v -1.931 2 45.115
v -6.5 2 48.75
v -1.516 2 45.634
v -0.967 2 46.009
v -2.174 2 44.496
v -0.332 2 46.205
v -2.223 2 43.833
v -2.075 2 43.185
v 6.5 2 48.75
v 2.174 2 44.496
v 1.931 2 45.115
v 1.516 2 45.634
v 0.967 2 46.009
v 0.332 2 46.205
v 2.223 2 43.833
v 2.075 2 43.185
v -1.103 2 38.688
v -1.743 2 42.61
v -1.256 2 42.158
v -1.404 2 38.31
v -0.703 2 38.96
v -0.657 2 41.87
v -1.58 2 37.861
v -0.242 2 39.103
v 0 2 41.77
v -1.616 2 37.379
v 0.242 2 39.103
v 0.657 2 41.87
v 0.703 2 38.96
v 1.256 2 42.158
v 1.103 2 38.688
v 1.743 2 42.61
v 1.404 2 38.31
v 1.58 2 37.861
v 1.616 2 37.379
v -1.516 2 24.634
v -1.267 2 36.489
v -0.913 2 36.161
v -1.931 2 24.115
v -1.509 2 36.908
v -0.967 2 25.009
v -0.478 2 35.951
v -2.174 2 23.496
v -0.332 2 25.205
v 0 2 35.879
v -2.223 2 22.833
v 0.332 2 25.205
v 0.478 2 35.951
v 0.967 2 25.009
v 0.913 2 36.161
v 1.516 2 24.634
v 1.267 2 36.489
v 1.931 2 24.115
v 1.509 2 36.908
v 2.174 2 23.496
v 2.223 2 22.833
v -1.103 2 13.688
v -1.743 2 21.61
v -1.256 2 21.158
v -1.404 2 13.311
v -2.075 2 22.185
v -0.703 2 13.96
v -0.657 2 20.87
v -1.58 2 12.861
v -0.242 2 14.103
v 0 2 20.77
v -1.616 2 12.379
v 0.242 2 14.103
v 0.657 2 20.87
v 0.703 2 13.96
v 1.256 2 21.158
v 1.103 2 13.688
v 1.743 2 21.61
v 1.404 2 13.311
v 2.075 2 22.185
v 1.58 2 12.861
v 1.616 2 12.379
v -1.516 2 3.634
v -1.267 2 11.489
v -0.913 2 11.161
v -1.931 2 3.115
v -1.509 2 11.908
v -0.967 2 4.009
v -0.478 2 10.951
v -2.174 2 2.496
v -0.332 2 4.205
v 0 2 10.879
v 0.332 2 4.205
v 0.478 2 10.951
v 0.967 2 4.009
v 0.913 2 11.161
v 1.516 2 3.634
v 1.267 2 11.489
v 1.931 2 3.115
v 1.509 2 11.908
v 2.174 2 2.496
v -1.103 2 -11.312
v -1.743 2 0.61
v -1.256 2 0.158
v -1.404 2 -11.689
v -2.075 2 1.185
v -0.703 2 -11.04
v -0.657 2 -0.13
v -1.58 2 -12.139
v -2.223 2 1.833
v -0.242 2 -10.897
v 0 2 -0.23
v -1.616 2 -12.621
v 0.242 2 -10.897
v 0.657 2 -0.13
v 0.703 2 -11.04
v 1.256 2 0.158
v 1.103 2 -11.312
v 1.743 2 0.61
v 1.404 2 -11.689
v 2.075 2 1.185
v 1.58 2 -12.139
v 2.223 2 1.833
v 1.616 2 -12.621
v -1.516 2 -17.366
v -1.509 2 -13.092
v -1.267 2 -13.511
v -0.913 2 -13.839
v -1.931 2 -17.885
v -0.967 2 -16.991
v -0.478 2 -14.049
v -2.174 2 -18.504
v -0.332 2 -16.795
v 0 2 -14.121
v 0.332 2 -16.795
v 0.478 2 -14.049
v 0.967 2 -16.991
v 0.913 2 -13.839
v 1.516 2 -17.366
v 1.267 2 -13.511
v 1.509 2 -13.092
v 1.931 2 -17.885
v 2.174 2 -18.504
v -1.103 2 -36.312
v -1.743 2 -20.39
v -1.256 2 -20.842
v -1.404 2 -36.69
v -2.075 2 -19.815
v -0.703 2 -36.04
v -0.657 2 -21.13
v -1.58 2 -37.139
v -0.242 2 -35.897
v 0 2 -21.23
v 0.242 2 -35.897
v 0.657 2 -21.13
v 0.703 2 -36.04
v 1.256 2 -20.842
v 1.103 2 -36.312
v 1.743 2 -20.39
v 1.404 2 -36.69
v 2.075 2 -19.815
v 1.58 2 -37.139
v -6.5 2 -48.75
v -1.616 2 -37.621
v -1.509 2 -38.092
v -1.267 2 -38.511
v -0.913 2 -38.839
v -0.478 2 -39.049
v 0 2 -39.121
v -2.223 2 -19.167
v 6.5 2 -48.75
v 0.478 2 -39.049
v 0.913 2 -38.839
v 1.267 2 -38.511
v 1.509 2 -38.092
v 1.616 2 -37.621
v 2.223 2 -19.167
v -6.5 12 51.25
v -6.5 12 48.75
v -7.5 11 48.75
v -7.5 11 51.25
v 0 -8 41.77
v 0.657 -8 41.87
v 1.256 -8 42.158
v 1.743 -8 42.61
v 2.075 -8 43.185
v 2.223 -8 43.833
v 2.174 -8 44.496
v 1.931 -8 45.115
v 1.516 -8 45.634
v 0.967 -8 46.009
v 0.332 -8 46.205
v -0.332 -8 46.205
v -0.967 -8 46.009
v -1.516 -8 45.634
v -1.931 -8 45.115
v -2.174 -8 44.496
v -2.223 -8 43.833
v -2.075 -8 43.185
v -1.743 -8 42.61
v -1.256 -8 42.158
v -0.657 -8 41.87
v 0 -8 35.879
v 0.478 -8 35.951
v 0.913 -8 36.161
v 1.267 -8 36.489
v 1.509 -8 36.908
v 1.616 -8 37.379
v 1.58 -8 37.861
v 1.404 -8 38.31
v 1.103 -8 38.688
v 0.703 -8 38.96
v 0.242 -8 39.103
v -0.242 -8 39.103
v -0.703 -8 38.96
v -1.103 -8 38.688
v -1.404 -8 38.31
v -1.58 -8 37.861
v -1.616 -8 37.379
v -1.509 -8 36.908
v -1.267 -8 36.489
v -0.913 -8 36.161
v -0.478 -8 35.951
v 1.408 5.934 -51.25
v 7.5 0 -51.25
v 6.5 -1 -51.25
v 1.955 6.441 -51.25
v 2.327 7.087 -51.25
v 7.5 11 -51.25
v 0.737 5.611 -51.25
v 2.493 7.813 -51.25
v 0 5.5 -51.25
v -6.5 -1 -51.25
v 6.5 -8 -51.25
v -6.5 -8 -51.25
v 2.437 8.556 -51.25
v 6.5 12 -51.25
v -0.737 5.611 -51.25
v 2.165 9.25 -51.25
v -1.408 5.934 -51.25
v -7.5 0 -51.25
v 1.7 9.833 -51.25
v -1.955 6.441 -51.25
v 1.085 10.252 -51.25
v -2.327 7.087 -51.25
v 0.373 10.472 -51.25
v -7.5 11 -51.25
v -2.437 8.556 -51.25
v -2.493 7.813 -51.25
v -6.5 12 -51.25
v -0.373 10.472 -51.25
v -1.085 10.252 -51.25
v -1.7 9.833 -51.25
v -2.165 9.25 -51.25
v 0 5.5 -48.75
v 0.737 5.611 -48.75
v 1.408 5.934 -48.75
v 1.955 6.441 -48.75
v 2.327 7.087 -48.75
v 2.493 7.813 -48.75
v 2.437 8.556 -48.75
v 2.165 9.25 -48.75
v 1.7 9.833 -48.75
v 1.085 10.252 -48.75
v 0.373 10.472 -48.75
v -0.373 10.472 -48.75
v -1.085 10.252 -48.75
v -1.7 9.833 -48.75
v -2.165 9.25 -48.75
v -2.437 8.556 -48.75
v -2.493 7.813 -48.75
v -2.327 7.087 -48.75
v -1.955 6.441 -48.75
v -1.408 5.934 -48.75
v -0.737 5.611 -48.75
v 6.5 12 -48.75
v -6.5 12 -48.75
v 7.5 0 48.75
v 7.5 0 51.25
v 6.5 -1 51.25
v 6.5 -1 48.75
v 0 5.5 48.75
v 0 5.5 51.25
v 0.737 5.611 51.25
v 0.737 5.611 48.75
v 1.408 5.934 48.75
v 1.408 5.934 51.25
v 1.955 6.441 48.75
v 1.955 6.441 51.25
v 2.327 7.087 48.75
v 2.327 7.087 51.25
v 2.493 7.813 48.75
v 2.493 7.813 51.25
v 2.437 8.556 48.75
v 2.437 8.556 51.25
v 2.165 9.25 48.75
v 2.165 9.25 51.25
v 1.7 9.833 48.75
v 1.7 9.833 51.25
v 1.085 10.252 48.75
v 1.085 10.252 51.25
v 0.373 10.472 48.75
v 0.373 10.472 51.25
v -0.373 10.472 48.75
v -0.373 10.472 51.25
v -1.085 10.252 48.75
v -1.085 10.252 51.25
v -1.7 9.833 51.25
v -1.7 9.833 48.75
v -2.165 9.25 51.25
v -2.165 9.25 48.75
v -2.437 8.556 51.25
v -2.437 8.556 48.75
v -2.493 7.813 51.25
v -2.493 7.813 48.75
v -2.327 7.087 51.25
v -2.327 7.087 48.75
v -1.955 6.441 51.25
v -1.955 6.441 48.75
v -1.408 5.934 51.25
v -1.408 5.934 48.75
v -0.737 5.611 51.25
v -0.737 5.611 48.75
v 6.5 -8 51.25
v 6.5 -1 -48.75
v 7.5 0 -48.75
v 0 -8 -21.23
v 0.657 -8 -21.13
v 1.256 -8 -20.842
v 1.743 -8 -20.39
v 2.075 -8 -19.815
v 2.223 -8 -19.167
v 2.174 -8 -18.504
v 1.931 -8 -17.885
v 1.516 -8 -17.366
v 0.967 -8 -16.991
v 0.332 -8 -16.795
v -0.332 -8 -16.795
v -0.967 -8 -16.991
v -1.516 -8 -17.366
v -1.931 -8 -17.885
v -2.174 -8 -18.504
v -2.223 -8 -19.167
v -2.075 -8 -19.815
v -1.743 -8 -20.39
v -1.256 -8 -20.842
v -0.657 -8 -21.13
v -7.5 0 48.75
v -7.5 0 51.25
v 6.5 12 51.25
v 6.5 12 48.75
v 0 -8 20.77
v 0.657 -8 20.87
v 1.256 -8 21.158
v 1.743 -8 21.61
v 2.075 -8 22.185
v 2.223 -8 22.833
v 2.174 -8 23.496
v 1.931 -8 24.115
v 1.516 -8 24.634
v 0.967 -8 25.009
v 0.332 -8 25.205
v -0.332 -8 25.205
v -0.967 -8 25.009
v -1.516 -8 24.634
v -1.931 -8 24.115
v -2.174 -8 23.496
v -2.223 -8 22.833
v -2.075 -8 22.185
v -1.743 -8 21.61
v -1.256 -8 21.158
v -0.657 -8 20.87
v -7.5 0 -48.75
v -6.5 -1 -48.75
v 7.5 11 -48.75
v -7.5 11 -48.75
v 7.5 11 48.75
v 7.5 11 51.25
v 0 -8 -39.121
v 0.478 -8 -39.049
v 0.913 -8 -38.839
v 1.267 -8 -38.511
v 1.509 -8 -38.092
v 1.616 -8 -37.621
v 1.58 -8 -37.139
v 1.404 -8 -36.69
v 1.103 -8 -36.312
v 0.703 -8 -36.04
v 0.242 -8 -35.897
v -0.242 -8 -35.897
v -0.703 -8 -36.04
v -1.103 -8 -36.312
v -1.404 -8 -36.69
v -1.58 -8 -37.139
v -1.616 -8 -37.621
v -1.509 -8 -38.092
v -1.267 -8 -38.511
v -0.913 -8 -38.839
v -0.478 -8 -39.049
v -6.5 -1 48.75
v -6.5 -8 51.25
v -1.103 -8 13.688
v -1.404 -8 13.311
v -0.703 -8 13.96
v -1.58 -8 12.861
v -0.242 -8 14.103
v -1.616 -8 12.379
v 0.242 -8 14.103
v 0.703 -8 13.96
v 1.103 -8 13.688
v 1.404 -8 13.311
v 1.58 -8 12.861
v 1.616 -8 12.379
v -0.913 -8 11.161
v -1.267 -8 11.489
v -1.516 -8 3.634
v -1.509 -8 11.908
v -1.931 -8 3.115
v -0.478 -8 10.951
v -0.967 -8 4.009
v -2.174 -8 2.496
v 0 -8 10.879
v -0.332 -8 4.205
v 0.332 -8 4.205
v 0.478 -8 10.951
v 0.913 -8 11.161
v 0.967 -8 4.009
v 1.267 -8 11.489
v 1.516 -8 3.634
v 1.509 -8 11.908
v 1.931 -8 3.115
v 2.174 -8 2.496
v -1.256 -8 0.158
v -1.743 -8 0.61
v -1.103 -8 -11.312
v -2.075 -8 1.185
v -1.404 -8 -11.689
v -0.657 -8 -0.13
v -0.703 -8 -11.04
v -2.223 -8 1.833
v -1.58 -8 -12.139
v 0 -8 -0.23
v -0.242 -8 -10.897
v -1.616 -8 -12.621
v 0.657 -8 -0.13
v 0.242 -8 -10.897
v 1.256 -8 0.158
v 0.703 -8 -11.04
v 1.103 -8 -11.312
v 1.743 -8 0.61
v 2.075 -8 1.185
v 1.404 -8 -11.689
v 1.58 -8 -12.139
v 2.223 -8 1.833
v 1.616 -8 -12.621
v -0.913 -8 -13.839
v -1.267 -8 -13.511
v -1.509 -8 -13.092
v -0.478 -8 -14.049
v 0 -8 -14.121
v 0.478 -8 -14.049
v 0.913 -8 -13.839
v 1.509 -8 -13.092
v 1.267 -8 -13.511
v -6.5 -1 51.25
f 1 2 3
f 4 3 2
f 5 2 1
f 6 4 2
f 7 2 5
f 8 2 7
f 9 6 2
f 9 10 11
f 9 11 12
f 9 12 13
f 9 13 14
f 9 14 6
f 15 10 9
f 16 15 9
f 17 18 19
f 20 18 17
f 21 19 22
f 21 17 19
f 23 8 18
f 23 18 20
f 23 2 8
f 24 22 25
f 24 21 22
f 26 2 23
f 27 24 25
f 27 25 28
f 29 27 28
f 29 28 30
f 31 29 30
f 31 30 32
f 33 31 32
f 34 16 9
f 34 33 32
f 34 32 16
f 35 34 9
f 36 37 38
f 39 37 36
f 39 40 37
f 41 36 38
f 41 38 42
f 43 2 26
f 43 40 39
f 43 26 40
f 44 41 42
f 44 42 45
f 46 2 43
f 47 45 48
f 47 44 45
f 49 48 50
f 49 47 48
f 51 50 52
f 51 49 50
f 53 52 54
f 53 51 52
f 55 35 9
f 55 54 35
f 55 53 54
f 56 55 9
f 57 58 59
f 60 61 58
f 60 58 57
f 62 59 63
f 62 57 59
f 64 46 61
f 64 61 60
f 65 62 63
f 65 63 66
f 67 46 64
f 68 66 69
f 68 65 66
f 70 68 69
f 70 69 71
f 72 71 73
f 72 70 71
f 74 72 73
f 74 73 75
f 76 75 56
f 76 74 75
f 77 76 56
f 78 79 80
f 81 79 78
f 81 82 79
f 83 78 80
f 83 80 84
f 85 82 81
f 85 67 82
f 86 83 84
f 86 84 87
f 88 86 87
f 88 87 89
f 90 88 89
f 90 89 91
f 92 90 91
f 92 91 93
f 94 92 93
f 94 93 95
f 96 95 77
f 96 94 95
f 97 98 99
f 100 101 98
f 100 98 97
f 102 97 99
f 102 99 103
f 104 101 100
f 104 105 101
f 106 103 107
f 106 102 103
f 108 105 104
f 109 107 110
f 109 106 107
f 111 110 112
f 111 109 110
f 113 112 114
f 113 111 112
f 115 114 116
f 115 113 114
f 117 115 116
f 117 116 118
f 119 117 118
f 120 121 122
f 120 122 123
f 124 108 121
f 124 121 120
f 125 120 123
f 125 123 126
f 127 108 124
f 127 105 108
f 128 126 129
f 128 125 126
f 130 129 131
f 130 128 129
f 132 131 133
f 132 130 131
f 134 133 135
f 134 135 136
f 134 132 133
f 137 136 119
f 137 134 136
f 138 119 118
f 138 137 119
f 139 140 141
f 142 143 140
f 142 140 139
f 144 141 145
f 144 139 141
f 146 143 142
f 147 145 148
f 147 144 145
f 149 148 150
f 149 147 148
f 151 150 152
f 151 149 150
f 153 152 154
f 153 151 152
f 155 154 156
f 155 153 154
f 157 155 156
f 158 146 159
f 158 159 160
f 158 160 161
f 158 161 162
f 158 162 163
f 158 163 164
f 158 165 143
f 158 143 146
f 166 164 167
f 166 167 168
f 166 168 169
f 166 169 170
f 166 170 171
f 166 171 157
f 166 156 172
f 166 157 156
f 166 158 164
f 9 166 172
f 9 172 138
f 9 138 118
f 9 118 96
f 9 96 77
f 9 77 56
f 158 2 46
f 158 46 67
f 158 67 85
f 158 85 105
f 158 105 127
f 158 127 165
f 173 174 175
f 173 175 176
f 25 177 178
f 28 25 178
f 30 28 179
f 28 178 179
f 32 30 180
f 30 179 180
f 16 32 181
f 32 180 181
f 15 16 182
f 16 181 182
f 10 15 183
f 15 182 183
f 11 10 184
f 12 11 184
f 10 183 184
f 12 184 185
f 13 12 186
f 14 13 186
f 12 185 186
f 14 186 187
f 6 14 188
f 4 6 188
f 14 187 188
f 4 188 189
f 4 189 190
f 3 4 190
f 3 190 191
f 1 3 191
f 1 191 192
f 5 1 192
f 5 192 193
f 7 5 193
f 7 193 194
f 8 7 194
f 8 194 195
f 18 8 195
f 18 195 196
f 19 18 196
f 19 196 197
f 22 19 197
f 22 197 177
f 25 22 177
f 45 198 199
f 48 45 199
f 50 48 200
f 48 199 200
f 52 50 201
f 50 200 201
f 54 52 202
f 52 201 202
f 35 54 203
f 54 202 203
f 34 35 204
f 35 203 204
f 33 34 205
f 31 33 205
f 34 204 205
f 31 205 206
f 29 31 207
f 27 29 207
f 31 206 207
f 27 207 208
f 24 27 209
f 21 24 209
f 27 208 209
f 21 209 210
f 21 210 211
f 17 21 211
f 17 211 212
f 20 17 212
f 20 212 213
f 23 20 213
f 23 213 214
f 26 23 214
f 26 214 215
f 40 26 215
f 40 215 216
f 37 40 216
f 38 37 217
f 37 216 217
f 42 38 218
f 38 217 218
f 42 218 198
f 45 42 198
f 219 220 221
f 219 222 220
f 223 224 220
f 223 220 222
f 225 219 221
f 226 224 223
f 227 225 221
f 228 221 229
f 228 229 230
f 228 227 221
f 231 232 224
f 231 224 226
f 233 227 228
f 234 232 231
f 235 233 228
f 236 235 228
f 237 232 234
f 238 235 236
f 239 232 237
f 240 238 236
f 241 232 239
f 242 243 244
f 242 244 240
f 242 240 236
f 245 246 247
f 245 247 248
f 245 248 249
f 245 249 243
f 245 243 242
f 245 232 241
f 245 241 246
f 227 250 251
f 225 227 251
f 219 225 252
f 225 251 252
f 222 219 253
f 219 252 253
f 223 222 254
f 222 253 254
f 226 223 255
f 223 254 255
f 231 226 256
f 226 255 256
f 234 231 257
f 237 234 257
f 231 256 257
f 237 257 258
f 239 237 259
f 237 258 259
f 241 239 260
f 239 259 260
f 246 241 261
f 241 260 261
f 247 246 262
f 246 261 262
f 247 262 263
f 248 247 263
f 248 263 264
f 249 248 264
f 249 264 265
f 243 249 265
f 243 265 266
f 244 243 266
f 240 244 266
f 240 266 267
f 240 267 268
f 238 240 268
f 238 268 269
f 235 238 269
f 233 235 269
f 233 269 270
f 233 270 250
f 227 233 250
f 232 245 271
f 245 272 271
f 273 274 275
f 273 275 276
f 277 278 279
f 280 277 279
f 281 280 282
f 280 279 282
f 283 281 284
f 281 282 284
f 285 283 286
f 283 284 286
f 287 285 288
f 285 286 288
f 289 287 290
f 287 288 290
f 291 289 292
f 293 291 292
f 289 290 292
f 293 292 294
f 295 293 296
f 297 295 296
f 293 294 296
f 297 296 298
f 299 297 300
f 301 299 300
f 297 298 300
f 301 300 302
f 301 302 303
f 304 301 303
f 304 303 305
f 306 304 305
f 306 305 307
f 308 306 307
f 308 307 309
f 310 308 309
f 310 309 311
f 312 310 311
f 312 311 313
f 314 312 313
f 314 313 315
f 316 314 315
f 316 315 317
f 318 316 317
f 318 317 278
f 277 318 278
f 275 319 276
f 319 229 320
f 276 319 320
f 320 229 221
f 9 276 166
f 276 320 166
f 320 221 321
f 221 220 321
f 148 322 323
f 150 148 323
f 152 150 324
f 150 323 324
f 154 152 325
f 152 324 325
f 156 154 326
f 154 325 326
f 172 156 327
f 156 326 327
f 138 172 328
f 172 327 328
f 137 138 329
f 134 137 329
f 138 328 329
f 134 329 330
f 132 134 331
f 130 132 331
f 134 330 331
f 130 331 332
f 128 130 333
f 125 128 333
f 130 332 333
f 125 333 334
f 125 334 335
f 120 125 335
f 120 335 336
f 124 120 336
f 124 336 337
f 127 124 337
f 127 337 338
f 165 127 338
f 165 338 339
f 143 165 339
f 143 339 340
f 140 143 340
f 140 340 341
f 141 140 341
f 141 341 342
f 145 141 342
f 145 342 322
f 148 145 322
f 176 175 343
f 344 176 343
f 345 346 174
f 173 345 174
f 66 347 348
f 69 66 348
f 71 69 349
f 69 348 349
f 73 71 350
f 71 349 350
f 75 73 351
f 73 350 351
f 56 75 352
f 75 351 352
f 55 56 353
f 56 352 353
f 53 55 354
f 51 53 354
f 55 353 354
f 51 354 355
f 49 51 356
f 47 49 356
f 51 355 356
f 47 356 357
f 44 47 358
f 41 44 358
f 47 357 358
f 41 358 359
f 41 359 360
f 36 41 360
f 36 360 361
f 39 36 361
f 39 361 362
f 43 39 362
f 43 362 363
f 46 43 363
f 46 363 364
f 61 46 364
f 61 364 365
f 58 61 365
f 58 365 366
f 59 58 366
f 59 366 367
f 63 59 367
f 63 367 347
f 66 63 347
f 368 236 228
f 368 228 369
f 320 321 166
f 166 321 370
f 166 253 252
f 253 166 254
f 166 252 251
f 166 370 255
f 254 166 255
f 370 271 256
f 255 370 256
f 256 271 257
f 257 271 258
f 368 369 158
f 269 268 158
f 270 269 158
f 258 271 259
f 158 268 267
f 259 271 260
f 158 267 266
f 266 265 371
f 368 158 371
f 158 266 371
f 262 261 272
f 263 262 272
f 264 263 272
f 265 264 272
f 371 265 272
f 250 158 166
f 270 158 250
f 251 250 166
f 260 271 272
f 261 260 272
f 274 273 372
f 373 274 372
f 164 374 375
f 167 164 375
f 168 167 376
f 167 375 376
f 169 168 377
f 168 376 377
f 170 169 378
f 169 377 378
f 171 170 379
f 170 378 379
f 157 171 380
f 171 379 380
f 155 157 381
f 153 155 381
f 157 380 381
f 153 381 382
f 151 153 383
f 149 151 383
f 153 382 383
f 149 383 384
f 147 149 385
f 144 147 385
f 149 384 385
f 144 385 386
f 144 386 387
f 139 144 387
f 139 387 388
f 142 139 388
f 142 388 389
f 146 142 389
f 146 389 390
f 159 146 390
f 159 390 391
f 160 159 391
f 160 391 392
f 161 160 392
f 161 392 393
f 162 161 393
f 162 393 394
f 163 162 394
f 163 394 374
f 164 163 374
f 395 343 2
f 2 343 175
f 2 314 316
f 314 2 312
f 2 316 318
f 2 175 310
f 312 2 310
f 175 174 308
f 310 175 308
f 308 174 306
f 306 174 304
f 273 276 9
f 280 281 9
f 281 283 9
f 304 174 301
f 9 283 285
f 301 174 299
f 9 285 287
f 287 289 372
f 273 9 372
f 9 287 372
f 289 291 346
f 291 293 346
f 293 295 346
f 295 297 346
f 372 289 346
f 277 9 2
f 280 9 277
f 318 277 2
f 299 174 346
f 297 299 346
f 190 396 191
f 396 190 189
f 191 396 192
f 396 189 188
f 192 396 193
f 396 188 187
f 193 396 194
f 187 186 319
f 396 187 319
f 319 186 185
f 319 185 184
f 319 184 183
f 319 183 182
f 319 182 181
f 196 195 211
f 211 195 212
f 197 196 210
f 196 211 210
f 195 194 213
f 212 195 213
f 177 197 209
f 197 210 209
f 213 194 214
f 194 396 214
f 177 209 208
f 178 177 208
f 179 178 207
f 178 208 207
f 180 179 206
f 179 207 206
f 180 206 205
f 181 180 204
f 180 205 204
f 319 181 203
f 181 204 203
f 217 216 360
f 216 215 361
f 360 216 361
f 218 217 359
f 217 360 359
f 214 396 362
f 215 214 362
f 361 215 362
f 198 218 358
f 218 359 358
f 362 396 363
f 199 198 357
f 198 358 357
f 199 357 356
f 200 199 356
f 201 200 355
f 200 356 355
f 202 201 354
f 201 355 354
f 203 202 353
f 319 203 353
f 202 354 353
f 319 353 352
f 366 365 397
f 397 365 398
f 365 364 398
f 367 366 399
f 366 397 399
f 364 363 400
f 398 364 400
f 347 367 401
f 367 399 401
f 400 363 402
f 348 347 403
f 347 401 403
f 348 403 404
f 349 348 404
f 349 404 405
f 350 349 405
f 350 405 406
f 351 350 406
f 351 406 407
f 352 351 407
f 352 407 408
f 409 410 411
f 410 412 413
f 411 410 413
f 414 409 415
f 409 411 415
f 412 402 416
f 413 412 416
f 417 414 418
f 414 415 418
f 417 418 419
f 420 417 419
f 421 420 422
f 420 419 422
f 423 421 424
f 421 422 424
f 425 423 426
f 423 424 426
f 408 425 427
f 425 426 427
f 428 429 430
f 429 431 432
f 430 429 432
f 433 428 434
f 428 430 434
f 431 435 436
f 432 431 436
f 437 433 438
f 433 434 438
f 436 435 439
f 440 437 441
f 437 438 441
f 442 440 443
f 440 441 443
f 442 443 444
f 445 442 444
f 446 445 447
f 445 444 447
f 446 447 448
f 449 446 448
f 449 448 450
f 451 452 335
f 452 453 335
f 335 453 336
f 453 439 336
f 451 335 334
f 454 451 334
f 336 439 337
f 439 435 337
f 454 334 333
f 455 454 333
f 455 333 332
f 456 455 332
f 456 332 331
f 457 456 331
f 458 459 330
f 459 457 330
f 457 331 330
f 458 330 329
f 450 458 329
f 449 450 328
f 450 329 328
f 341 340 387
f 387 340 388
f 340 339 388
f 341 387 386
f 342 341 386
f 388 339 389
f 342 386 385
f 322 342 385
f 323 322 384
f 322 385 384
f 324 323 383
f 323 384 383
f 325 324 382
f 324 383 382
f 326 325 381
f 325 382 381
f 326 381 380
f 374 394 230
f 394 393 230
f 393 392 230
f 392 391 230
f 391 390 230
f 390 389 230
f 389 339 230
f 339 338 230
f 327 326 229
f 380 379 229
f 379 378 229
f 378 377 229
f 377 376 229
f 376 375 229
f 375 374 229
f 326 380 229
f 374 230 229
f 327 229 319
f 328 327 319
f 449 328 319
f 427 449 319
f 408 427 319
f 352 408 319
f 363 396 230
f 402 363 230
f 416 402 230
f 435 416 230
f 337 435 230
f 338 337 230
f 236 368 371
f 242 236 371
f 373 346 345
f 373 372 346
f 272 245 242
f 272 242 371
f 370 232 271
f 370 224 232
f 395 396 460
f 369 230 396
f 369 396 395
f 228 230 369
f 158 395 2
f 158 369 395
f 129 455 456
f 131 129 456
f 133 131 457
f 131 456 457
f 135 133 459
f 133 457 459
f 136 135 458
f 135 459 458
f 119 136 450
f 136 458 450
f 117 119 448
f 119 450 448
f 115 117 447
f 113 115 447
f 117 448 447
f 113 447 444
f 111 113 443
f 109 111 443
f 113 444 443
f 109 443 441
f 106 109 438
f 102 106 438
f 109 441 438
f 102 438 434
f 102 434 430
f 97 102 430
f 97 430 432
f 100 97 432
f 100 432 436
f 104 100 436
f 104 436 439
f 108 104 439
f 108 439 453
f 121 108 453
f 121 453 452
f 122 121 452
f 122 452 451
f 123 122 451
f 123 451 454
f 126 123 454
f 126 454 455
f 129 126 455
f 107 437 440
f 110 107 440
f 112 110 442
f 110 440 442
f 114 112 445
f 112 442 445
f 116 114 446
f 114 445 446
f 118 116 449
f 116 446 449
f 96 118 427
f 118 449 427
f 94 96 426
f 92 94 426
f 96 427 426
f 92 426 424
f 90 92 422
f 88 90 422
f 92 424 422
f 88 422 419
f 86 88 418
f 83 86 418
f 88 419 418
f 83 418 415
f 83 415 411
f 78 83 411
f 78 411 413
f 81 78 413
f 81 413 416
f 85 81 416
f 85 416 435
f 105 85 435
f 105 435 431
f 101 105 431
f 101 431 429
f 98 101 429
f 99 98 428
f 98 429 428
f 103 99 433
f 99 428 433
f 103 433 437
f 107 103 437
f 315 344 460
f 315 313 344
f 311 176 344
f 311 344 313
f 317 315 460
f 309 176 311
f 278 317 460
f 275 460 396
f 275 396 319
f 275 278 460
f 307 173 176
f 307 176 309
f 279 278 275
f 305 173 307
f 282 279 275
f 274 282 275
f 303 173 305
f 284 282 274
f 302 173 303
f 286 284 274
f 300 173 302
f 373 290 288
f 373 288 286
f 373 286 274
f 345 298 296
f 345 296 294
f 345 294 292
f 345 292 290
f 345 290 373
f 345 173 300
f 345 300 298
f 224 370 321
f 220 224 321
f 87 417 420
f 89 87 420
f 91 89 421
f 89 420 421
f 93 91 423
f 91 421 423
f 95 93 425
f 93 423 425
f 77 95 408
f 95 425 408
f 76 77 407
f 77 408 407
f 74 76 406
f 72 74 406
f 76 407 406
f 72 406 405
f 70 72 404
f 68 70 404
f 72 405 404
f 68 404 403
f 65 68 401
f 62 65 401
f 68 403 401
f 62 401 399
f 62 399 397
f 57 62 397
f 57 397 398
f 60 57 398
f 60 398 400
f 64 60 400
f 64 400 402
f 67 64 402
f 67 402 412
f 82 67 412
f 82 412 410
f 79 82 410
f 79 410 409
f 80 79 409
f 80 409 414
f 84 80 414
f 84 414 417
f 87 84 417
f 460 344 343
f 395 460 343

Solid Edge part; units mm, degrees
sketch "Sketch1" plane through (0, 0, 0) normal (0, 0, 1) x (1, 0, 0)
  line L0 (-6.5, -8) -> (6.5, -8)
  line L1 (6.5, -8) -> (6.5, 2)
  line L2 (-6.5, 2) -> (6.5, 2)
  line L3 (-6.5, -8) -> (-6.5, 2)
  dimension "D1" = 13
  dimension "D2" = 10
  dimension "D3" = 13
  dimension "D4" = 6.5
  dimension "D5" = 2
extrude "Ajout_matière_1" add sketch "Sketch1" along normal mid plane 100
hole "Hole1" at (0, -8, -19) direction (0, 1, 0) diameter 4.459 end up to next
hole "Hole2" at (0, -8, 23) direction (0, 1, 0) diameter 4.459 end up to next
hole "Hole3" at (0, -8, 2) direction (0, 1, 0) diameter 4.459 end up to next
hole "Hole4" at (0, -8, 44) direction (0, 1, 0) diameter 4.459 end up to next
sketch "Sketch2" plane through (0, 2, -50) normal (0, 0, -1) x (0, 1, 0)
  line L0 (-10, -6.5) -> (-2, -6.5)
  line L1 (-2, -6.5) -> (-2, -7.5)
  line L2 (-2, -7.5) -> (10, -7.5)
  line L3 (10, -7.5) -> (10, 7.5)
  line L4 (10, 7.5) -> (-2, 7.5)
  line L5 (-2, 7.5) -> (-2, 6.5)
  line L6 (-2, 6.5) -> (-10, 6.5)
  line L7 (-10, 6.5) -> (-10, -6.5)
extrude "Ajout_matière_3" add sketch "Sketch2" along normal mid plane 2.5
mirror "Mirror1" about plane through (0, 0, 0) normal (0, 0, 1) of "Ajout_matière_3"
hole "Perçage_2" at (0, 8, 51.25) direction (0, 0, -1) diameter 5 end through all
chamfer "Chamfer1" distance 1 angle 45 8 edges at (-7.5, 12, 50) (-7.5, 12, -50) (-6.5, 0, 50) (-6.5, 0, -50) (6.5, 0, 50) (6.5, 0, -50) (7.5, 12, 50) (7.5, 12, -50)
hole "Perçage_6" at (0, -8, -12.5) direction (0, 1, 0) diameter 3.242 end up to next
hole "Hole5" at (0, -8, 12.5) direction (0, 1, 0) diameter 3.242 end up to next
hole "Hole6" at (0, -8, -37.5) direction (0, 1, 0) diameter 3.242 end up to next
hole "Hole7" at (0, -8, 37.5) direction (0, 1, 0) diameter 3.242 end up to next
properties material "Aluminium AU4G, 2024_T4"
